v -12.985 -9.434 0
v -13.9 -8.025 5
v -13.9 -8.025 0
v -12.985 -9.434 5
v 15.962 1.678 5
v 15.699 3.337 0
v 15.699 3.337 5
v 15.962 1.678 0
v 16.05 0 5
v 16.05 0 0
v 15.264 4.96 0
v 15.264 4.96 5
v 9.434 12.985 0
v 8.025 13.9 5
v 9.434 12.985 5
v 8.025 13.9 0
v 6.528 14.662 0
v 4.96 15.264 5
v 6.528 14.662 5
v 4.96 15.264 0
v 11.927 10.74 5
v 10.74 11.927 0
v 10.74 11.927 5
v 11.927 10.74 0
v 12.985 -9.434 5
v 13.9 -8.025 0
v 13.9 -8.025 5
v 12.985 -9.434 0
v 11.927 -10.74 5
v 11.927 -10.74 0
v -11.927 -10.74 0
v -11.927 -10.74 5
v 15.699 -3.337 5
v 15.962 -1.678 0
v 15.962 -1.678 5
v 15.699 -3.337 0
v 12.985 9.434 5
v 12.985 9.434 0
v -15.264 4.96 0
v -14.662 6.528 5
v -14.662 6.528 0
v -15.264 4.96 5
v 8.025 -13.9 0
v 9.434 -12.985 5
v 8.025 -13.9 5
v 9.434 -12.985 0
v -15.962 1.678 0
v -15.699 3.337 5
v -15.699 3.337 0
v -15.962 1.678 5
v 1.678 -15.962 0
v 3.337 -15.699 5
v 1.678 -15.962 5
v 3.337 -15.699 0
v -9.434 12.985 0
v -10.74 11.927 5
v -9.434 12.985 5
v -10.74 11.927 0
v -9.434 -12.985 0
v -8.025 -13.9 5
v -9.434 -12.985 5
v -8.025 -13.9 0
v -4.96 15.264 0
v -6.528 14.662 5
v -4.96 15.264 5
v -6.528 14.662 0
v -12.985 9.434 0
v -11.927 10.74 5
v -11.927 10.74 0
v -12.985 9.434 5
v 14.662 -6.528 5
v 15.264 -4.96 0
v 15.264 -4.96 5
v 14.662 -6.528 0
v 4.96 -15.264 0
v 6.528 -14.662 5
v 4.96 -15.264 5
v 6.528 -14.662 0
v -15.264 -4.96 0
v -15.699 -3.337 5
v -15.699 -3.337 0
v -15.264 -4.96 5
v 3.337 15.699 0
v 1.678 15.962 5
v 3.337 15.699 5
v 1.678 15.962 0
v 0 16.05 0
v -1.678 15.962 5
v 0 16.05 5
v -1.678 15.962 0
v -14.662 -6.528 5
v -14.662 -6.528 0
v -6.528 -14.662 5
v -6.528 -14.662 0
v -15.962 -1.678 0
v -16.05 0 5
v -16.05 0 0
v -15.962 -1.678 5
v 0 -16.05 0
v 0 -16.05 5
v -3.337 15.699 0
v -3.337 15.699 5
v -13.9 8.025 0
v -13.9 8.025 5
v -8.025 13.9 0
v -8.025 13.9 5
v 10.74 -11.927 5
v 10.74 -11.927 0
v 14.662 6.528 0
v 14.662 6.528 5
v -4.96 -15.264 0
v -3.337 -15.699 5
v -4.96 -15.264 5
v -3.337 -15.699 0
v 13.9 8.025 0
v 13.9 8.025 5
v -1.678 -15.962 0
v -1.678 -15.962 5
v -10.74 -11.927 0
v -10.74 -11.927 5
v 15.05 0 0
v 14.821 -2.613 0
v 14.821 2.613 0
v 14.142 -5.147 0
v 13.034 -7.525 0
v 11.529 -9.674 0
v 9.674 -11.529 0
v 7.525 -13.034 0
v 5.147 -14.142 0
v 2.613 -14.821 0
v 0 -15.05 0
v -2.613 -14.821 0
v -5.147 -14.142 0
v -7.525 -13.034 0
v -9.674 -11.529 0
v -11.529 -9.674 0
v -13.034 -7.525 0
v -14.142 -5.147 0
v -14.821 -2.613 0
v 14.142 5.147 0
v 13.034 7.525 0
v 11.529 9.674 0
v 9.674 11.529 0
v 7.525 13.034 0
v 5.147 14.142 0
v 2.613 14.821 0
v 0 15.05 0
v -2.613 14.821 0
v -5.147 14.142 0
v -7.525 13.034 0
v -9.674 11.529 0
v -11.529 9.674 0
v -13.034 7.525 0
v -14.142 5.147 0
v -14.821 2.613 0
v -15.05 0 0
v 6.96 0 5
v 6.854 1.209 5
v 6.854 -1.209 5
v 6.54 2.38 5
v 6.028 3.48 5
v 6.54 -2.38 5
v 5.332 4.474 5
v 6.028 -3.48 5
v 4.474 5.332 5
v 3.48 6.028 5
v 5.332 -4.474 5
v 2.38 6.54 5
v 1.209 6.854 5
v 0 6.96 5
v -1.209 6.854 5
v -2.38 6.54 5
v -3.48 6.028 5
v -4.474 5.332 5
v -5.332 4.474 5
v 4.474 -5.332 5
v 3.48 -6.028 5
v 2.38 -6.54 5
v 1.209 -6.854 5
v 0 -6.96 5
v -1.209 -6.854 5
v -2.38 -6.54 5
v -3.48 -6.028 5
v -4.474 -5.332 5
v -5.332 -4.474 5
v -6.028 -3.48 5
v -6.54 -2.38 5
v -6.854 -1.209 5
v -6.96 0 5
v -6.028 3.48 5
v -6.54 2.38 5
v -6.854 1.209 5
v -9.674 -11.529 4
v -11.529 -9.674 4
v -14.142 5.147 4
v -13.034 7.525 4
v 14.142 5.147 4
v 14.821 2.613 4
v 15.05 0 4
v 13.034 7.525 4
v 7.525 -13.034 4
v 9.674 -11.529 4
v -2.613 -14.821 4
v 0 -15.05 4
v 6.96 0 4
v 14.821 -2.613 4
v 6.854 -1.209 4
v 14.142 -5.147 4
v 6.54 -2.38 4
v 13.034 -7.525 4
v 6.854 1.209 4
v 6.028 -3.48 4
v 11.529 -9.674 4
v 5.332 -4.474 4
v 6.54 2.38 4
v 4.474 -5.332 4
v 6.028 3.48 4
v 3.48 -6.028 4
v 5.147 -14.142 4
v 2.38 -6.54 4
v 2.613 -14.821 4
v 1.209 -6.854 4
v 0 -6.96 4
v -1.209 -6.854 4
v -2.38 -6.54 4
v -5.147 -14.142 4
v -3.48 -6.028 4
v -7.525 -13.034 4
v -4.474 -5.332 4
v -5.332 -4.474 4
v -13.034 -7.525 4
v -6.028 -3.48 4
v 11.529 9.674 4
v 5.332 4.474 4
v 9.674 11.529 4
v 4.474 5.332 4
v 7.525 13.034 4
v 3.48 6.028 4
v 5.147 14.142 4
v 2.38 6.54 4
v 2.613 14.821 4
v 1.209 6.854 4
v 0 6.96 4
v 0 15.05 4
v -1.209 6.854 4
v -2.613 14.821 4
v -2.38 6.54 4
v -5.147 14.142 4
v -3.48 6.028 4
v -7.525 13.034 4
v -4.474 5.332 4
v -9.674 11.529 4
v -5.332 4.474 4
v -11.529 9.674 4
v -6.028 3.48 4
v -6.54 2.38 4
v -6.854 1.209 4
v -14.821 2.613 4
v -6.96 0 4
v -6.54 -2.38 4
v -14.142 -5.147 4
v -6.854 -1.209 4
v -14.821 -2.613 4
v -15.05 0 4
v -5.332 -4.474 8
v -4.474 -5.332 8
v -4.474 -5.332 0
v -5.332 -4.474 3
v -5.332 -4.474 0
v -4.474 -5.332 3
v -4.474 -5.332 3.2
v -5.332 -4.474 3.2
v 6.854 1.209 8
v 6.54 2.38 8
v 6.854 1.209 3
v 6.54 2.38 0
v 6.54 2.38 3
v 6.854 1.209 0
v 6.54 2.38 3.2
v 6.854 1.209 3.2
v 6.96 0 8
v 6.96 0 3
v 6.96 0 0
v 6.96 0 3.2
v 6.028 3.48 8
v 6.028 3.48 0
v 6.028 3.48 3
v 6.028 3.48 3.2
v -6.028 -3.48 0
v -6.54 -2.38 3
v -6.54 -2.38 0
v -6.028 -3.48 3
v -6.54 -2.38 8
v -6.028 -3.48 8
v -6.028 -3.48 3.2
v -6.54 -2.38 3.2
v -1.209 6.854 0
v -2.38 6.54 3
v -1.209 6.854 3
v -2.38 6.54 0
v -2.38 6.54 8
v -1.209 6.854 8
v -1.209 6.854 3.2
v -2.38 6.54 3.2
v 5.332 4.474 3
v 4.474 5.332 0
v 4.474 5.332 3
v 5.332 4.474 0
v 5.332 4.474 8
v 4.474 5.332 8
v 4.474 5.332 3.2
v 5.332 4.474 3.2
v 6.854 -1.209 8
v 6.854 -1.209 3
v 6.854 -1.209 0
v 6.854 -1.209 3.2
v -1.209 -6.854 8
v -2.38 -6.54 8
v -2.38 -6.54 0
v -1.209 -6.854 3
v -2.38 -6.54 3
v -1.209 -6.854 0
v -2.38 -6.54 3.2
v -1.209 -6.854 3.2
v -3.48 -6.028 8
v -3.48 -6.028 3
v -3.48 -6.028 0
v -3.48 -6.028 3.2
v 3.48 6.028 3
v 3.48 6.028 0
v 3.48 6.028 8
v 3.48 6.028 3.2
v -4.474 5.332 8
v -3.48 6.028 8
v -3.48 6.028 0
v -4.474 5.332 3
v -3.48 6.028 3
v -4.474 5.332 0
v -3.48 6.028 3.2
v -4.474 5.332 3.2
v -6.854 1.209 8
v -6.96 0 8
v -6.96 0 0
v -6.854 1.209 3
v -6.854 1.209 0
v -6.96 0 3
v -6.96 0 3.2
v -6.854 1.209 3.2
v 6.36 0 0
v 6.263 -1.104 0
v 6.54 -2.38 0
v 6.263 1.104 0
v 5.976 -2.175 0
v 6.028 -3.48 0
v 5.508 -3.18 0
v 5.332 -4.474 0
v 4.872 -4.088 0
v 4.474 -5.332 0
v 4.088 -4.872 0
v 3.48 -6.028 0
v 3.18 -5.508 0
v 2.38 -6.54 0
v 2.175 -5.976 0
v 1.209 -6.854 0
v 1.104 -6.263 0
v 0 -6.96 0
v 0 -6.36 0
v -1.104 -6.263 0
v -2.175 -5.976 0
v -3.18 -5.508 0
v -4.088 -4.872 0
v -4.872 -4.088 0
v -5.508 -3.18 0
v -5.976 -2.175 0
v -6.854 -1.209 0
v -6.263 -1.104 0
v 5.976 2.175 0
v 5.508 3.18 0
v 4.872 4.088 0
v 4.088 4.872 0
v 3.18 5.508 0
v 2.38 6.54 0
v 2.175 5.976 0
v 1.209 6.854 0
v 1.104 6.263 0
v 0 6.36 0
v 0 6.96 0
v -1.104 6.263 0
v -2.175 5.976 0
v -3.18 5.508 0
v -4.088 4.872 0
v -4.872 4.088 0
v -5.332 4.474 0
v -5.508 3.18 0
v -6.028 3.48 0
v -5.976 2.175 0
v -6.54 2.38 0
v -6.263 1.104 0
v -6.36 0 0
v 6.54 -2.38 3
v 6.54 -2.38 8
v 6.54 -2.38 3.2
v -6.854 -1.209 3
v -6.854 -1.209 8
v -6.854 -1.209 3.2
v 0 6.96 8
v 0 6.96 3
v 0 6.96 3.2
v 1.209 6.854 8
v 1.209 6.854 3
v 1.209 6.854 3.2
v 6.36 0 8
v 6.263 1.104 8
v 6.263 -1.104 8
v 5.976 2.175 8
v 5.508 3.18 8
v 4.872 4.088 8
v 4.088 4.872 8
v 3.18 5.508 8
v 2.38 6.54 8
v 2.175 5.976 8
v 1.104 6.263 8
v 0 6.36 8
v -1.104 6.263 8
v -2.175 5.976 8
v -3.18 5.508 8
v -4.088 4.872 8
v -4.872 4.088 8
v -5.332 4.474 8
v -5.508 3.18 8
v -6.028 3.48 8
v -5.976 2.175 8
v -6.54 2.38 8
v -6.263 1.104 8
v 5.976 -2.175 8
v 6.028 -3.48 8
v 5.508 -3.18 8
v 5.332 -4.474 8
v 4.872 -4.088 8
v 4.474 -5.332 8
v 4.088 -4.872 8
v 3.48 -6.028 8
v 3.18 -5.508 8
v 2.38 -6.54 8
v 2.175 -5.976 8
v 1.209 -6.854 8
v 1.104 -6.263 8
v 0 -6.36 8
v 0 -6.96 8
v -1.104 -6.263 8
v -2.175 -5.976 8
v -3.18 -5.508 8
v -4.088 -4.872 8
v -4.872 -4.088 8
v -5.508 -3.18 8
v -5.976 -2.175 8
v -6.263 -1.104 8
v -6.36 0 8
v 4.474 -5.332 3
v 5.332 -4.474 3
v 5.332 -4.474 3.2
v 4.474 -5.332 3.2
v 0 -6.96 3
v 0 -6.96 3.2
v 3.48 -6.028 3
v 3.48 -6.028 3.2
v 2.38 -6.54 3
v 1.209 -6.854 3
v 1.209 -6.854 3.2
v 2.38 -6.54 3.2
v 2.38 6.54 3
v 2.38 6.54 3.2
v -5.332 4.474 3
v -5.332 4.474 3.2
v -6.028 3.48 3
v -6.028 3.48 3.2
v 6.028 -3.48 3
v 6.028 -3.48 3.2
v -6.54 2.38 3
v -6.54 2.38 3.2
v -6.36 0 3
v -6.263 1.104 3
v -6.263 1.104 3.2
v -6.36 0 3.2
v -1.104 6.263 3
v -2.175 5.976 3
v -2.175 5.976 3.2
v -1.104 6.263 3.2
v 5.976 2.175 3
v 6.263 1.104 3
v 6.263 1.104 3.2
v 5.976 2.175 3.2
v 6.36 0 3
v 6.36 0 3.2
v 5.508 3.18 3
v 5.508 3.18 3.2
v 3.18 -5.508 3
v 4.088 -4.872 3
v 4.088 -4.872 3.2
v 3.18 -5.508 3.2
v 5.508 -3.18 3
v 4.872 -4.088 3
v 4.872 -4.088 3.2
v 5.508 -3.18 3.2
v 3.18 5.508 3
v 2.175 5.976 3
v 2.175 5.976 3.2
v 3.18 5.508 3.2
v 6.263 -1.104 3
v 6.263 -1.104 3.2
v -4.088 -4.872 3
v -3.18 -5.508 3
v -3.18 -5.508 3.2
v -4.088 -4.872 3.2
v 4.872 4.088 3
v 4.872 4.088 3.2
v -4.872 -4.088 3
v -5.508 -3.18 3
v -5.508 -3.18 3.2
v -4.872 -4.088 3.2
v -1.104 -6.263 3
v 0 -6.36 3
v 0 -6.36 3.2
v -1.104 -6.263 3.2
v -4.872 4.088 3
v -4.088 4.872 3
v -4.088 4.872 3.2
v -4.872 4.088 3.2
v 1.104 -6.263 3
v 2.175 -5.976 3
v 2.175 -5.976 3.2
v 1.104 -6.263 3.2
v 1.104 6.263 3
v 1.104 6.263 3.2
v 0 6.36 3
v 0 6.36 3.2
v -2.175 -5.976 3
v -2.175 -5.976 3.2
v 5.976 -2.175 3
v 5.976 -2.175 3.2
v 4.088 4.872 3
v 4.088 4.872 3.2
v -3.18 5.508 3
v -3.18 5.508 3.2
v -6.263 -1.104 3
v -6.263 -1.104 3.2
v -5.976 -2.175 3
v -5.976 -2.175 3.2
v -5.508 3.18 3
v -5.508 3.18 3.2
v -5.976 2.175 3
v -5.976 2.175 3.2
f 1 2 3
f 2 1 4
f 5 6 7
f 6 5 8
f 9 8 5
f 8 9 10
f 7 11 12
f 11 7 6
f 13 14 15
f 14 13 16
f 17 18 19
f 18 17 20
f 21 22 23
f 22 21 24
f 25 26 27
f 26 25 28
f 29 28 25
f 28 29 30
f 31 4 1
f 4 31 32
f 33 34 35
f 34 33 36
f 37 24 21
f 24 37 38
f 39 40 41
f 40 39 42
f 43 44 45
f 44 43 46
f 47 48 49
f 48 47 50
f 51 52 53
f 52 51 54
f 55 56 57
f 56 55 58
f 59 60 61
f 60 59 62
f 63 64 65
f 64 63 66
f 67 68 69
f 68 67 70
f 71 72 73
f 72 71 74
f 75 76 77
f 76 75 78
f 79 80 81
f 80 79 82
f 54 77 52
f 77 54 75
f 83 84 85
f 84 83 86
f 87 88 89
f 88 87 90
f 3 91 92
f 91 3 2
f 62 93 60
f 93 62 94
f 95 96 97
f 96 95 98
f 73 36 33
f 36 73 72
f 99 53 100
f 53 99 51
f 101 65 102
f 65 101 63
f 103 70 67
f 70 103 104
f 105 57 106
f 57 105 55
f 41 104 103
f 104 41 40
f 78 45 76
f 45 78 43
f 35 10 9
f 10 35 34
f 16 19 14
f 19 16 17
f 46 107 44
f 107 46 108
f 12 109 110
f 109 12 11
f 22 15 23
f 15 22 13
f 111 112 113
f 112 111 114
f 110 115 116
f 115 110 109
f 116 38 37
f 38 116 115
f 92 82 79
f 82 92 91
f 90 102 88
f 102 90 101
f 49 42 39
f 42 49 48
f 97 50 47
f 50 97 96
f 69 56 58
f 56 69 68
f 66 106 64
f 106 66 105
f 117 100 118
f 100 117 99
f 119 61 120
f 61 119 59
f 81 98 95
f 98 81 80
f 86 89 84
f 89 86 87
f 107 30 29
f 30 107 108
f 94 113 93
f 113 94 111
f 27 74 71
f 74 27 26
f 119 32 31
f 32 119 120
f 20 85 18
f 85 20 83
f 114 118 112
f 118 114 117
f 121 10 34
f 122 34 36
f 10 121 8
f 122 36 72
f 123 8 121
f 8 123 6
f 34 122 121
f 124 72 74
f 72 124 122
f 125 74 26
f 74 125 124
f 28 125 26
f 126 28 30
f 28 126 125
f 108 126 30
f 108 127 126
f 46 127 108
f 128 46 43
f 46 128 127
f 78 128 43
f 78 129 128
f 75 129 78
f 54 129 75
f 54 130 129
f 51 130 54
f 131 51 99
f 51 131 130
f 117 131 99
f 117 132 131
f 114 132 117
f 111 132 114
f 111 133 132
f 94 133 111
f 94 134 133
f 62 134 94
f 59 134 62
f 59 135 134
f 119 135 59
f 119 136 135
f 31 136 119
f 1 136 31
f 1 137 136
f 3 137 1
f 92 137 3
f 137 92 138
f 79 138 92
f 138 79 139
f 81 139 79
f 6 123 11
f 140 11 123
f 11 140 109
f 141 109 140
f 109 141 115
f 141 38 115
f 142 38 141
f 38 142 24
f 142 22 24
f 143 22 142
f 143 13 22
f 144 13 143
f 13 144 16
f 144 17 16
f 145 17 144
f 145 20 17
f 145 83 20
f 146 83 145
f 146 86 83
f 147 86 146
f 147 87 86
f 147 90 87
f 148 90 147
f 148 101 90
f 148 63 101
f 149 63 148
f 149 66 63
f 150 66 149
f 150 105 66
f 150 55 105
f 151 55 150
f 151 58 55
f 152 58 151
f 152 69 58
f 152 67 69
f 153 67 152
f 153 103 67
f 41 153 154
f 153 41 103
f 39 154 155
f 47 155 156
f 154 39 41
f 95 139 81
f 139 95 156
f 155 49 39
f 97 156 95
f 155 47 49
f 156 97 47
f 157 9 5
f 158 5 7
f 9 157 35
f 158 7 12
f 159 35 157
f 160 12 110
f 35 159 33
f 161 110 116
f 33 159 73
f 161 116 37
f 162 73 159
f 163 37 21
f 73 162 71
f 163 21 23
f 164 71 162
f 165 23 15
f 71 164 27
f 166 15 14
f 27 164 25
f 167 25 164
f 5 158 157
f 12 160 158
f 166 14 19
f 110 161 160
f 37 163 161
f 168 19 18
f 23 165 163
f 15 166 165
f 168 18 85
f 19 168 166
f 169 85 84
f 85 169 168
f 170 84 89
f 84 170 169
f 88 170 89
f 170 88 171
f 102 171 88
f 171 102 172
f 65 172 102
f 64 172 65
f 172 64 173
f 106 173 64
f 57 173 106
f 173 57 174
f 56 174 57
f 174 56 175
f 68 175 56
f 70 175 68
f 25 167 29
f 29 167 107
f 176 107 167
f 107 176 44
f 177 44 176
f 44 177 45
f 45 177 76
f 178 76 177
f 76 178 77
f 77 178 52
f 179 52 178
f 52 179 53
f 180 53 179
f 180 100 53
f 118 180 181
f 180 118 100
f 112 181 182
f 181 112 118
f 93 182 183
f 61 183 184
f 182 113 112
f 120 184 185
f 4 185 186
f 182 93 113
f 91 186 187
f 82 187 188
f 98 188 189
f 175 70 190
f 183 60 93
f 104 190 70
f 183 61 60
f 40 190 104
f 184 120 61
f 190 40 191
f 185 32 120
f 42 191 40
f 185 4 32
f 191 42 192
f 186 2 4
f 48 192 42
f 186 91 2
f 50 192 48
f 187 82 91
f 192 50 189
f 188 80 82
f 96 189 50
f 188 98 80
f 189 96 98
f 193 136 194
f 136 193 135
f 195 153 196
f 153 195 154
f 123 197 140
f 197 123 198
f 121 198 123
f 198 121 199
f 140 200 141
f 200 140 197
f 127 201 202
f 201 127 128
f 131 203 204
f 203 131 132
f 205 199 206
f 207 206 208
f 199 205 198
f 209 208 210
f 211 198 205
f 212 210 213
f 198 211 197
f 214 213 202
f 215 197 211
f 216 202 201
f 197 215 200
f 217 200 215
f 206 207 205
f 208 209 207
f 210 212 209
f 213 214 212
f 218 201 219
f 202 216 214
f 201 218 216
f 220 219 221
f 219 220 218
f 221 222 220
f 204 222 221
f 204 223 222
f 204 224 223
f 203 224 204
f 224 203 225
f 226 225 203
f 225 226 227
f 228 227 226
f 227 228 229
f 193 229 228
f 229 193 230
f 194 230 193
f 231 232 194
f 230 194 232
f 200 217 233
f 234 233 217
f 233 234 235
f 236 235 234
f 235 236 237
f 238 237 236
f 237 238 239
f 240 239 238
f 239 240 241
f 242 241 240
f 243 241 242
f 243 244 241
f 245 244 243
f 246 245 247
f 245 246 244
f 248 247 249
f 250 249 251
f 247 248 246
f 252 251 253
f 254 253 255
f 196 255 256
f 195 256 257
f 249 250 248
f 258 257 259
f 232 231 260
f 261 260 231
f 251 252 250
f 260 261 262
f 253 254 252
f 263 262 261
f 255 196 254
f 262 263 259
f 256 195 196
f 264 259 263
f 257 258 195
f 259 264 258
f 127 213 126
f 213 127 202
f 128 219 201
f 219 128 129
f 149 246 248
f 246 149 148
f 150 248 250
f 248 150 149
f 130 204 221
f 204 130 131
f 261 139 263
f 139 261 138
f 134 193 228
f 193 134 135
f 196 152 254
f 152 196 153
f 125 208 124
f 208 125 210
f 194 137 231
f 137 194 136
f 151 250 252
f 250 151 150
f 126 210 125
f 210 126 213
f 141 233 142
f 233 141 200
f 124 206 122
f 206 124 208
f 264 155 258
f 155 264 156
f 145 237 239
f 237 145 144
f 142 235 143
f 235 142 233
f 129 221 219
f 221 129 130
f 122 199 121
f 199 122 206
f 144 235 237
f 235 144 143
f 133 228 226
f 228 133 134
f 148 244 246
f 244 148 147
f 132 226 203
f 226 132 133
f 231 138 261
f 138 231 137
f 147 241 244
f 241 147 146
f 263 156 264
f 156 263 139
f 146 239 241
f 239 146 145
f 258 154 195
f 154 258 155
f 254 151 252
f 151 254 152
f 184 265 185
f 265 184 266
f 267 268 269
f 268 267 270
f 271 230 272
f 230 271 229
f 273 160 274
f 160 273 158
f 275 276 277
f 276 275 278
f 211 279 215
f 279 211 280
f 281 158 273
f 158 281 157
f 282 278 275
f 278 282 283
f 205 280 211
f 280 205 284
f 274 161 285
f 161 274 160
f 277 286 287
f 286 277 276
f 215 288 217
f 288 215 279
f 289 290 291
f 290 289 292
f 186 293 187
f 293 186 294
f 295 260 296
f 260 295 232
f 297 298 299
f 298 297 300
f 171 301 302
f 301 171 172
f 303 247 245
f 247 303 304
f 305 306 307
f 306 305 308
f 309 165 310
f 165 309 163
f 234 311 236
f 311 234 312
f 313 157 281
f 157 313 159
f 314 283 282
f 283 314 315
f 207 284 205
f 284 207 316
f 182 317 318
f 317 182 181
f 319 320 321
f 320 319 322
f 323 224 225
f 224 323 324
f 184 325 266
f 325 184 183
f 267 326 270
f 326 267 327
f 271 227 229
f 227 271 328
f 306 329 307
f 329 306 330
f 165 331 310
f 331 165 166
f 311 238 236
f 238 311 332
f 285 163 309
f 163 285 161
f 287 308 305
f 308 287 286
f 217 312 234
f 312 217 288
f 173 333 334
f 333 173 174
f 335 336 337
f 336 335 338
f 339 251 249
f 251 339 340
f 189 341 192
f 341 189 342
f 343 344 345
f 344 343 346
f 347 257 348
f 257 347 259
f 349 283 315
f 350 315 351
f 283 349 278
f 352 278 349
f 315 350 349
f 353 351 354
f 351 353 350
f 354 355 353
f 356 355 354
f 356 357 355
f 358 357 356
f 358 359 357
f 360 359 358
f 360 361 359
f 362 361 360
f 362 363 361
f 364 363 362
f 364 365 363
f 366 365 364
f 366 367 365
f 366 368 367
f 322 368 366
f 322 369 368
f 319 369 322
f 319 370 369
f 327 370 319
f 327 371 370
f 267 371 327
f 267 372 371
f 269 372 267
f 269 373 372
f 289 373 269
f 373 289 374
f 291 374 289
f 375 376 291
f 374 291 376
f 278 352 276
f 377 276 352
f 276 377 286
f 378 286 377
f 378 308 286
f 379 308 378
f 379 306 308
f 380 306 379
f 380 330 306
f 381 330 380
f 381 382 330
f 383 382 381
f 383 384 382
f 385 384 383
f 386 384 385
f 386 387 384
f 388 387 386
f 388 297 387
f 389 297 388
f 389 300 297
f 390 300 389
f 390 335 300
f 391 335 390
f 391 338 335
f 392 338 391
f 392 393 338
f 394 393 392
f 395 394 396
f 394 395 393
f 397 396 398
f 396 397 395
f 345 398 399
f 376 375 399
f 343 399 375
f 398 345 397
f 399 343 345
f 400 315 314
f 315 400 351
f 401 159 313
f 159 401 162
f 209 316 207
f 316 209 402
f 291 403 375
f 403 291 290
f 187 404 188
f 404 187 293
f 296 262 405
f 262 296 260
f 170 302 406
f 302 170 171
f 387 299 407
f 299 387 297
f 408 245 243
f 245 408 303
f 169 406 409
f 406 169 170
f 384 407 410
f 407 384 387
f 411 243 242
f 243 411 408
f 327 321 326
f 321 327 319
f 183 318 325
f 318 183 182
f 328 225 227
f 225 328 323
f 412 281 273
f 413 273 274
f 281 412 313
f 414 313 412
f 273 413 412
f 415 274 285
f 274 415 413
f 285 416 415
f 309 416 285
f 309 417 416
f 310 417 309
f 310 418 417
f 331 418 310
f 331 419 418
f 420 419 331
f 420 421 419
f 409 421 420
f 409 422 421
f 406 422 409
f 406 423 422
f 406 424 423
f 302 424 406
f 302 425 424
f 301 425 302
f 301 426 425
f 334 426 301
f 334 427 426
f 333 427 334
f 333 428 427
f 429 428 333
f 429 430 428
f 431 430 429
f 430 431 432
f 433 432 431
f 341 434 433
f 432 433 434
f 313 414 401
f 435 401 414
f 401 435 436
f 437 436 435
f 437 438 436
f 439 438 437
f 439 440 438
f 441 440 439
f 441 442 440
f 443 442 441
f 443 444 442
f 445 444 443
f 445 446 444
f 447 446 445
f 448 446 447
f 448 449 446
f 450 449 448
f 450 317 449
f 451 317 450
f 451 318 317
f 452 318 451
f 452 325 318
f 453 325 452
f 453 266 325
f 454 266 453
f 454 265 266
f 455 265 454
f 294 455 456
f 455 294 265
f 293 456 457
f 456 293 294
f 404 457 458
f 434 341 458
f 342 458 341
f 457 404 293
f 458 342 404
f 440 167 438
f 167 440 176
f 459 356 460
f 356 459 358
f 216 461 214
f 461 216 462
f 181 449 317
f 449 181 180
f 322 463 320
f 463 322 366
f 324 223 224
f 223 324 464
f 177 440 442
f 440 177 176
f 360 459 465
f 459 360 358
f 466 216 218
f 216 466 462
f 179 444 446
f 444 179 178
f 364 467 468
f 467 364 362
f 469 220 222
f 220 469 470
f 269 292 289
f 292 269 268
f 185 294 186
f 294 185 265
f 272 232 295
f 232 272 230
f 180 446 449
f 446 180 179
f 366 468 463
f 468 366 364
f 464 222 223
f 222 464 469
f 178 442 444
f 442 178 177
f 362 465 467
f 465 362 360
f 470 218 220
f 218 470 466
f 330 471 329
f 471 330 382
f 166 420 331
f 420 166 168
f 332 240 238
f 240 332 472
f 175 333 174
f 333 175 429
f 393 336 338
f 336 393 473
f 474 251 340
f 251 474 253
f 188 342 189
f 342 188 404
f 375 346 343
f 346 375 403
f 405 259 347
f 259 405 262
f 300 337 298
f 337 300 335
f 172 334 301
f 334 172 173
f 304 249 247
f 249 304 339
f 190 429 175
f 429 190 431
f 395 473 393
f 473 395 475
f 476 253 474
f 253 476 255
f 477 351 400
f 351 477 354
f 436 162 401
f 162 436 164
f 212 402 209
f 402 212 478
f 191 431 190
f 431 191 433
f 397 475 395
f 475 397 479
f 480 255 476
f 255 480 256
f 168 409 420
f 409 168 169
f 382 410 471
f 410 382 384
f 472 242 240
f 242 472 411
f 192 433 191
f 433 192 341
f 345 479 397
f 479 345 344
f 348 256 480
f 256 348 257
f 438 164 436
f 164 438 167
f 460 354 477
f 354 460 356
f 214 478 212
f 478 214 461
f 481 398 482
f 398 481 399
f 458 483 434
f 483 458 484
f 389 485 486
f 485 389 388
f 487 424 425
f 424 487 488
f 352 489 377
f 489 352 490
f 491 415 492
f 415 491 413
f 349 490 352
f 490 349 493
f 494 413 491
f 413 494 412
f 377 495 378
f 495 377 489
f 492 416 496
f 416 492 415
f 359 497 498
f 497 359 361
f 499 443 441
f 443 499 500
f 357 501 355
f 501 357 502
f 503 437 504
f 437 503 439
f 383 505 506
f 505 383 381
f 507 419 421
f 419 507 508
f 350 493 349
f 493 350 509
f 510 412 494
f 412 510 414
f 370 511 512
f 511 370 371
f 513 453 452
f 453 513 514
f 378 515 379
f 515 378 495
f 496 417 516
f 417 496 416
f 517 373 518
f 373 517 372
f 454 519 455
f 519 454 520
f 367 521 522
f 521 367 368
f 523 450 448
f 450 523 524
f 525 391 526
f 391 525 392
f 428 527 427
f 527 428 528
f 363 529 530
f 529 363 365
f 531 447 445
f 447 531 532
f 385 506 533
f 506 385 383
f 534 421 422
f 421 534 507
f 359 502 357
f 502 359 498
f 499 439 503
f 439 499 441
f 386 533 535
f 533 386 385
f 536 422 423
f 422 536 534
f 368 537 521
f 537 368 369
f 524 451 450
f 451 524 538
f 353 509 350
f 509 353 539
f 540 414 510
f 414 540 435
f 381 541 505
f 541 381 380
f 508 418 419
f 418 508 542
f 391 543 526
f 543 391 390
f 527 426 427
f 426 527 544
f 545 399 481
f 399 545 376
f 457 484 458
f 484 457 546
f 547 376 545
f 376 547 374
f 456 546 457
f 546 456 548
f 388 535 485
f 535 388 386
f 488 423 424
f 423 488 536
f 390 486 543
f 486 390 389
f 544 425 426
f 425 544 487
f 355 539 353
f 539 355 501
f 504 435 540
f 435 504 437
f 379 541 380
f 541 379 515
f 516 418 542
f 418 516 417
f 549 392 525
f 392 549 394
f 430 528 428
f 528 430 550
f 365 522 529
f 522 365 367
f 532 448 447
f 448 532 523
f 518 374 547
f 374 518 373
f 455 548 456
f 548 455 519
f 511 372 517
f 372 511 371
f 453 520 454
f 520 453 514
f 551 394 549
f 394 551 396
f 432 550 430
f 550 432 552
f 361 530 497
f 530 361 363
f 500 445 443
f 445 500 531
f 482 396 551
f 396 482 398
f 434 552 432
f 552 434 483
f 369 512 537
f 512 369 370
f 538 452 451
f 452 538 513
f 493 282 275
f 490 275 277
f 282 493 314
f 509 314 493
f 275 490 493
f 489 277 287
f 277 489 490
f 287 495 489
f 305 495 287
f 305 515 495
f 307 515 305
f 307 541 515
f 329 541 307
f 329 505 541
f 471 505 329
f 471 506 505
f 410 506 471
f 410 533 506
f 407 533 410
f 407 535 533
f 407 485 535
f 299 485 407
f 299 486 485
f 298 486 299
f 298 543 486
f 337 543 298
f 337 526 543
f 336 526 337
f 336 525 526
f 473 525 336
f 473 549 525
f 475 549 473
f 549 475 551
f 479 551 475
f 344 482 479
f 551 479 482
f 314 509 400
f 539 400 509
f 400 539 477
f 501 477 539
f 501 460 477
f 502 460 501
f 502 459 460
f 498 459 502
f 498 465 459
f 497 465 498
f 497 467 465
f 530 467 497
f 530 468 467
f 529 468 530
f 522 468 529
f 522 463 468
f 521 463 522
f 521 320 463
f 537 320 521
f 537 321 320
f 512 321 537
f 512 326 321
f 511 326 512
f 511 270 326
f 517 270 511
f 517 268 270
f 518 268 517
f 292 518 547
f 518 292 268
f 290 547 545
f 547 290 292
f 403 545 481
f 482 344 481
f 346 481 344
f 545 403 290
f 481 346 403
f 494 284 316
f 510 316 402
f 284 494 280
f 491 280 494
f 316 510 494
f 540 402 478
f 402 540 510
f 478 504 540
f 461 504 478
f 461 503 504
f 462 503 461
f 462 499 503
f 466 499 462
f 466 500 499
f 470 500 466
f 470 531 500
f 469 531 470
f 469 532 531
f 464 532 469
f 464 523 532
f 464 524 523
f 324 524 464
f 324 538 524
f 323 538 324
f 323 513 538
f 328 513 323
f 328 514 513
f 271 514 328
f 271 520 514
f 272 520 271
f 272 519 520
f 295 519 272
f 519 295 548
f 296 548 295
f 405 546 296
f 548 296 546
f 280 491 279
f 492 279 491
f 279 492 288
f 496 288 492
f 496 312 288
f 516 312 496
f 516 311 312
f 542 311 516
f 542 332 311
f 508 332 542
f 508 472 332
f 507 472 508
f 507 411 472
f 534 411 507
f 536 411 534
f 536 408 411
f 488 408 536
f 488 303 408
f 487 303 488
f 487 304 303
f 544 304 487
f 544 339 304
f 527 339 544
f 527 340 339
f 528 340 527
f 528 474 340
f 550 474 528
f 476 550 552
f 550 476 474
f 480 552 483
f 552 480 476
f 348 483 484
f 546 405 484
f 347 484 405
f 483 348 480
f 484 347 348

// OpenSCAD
// Customizable Egg Holder

/* [parameter] */

//The diameter of the bottom of the egg.
egg_holder_outer_diameter=13.92;

egg_holder_wall_thickness=1.2;

egg_holder_height=3;

//The diameter of the Compact LED Light for CR2032.
base_inner_diameter=30.1;

base_wall_thickness=2;

base_height=5;


/* [Hidden] */


difference() {
    union() {
        //base
        difference() {
            cylinder(h=base_height, d=(base_inner_diameter+base_wall_thickness), $fn=60);
            translate([0,0,-0.05]) 
                cylinder(h=(base_height-0.95), d=base_inner_diameter,$fn=36);
        }
        
        //egg holder
        cylinder(h=(egg_holder_height+base_height), d=egg_holder_outer_diameter, $fn=36);
    }
    
    //egg holder hole
    translate([0,0,-0.05])
        cylinder(h=(egg_holder_height+base_height+0.1), d=(egg_holder_outer_diameter-egg_holder_wall_thickness), $fn=36);
    
    //support break
    translate([0,0,(base_height-2)])
        cylinder(h=0.2, d=(egg_holder_outer_diameter+2), $fn=36);
}
